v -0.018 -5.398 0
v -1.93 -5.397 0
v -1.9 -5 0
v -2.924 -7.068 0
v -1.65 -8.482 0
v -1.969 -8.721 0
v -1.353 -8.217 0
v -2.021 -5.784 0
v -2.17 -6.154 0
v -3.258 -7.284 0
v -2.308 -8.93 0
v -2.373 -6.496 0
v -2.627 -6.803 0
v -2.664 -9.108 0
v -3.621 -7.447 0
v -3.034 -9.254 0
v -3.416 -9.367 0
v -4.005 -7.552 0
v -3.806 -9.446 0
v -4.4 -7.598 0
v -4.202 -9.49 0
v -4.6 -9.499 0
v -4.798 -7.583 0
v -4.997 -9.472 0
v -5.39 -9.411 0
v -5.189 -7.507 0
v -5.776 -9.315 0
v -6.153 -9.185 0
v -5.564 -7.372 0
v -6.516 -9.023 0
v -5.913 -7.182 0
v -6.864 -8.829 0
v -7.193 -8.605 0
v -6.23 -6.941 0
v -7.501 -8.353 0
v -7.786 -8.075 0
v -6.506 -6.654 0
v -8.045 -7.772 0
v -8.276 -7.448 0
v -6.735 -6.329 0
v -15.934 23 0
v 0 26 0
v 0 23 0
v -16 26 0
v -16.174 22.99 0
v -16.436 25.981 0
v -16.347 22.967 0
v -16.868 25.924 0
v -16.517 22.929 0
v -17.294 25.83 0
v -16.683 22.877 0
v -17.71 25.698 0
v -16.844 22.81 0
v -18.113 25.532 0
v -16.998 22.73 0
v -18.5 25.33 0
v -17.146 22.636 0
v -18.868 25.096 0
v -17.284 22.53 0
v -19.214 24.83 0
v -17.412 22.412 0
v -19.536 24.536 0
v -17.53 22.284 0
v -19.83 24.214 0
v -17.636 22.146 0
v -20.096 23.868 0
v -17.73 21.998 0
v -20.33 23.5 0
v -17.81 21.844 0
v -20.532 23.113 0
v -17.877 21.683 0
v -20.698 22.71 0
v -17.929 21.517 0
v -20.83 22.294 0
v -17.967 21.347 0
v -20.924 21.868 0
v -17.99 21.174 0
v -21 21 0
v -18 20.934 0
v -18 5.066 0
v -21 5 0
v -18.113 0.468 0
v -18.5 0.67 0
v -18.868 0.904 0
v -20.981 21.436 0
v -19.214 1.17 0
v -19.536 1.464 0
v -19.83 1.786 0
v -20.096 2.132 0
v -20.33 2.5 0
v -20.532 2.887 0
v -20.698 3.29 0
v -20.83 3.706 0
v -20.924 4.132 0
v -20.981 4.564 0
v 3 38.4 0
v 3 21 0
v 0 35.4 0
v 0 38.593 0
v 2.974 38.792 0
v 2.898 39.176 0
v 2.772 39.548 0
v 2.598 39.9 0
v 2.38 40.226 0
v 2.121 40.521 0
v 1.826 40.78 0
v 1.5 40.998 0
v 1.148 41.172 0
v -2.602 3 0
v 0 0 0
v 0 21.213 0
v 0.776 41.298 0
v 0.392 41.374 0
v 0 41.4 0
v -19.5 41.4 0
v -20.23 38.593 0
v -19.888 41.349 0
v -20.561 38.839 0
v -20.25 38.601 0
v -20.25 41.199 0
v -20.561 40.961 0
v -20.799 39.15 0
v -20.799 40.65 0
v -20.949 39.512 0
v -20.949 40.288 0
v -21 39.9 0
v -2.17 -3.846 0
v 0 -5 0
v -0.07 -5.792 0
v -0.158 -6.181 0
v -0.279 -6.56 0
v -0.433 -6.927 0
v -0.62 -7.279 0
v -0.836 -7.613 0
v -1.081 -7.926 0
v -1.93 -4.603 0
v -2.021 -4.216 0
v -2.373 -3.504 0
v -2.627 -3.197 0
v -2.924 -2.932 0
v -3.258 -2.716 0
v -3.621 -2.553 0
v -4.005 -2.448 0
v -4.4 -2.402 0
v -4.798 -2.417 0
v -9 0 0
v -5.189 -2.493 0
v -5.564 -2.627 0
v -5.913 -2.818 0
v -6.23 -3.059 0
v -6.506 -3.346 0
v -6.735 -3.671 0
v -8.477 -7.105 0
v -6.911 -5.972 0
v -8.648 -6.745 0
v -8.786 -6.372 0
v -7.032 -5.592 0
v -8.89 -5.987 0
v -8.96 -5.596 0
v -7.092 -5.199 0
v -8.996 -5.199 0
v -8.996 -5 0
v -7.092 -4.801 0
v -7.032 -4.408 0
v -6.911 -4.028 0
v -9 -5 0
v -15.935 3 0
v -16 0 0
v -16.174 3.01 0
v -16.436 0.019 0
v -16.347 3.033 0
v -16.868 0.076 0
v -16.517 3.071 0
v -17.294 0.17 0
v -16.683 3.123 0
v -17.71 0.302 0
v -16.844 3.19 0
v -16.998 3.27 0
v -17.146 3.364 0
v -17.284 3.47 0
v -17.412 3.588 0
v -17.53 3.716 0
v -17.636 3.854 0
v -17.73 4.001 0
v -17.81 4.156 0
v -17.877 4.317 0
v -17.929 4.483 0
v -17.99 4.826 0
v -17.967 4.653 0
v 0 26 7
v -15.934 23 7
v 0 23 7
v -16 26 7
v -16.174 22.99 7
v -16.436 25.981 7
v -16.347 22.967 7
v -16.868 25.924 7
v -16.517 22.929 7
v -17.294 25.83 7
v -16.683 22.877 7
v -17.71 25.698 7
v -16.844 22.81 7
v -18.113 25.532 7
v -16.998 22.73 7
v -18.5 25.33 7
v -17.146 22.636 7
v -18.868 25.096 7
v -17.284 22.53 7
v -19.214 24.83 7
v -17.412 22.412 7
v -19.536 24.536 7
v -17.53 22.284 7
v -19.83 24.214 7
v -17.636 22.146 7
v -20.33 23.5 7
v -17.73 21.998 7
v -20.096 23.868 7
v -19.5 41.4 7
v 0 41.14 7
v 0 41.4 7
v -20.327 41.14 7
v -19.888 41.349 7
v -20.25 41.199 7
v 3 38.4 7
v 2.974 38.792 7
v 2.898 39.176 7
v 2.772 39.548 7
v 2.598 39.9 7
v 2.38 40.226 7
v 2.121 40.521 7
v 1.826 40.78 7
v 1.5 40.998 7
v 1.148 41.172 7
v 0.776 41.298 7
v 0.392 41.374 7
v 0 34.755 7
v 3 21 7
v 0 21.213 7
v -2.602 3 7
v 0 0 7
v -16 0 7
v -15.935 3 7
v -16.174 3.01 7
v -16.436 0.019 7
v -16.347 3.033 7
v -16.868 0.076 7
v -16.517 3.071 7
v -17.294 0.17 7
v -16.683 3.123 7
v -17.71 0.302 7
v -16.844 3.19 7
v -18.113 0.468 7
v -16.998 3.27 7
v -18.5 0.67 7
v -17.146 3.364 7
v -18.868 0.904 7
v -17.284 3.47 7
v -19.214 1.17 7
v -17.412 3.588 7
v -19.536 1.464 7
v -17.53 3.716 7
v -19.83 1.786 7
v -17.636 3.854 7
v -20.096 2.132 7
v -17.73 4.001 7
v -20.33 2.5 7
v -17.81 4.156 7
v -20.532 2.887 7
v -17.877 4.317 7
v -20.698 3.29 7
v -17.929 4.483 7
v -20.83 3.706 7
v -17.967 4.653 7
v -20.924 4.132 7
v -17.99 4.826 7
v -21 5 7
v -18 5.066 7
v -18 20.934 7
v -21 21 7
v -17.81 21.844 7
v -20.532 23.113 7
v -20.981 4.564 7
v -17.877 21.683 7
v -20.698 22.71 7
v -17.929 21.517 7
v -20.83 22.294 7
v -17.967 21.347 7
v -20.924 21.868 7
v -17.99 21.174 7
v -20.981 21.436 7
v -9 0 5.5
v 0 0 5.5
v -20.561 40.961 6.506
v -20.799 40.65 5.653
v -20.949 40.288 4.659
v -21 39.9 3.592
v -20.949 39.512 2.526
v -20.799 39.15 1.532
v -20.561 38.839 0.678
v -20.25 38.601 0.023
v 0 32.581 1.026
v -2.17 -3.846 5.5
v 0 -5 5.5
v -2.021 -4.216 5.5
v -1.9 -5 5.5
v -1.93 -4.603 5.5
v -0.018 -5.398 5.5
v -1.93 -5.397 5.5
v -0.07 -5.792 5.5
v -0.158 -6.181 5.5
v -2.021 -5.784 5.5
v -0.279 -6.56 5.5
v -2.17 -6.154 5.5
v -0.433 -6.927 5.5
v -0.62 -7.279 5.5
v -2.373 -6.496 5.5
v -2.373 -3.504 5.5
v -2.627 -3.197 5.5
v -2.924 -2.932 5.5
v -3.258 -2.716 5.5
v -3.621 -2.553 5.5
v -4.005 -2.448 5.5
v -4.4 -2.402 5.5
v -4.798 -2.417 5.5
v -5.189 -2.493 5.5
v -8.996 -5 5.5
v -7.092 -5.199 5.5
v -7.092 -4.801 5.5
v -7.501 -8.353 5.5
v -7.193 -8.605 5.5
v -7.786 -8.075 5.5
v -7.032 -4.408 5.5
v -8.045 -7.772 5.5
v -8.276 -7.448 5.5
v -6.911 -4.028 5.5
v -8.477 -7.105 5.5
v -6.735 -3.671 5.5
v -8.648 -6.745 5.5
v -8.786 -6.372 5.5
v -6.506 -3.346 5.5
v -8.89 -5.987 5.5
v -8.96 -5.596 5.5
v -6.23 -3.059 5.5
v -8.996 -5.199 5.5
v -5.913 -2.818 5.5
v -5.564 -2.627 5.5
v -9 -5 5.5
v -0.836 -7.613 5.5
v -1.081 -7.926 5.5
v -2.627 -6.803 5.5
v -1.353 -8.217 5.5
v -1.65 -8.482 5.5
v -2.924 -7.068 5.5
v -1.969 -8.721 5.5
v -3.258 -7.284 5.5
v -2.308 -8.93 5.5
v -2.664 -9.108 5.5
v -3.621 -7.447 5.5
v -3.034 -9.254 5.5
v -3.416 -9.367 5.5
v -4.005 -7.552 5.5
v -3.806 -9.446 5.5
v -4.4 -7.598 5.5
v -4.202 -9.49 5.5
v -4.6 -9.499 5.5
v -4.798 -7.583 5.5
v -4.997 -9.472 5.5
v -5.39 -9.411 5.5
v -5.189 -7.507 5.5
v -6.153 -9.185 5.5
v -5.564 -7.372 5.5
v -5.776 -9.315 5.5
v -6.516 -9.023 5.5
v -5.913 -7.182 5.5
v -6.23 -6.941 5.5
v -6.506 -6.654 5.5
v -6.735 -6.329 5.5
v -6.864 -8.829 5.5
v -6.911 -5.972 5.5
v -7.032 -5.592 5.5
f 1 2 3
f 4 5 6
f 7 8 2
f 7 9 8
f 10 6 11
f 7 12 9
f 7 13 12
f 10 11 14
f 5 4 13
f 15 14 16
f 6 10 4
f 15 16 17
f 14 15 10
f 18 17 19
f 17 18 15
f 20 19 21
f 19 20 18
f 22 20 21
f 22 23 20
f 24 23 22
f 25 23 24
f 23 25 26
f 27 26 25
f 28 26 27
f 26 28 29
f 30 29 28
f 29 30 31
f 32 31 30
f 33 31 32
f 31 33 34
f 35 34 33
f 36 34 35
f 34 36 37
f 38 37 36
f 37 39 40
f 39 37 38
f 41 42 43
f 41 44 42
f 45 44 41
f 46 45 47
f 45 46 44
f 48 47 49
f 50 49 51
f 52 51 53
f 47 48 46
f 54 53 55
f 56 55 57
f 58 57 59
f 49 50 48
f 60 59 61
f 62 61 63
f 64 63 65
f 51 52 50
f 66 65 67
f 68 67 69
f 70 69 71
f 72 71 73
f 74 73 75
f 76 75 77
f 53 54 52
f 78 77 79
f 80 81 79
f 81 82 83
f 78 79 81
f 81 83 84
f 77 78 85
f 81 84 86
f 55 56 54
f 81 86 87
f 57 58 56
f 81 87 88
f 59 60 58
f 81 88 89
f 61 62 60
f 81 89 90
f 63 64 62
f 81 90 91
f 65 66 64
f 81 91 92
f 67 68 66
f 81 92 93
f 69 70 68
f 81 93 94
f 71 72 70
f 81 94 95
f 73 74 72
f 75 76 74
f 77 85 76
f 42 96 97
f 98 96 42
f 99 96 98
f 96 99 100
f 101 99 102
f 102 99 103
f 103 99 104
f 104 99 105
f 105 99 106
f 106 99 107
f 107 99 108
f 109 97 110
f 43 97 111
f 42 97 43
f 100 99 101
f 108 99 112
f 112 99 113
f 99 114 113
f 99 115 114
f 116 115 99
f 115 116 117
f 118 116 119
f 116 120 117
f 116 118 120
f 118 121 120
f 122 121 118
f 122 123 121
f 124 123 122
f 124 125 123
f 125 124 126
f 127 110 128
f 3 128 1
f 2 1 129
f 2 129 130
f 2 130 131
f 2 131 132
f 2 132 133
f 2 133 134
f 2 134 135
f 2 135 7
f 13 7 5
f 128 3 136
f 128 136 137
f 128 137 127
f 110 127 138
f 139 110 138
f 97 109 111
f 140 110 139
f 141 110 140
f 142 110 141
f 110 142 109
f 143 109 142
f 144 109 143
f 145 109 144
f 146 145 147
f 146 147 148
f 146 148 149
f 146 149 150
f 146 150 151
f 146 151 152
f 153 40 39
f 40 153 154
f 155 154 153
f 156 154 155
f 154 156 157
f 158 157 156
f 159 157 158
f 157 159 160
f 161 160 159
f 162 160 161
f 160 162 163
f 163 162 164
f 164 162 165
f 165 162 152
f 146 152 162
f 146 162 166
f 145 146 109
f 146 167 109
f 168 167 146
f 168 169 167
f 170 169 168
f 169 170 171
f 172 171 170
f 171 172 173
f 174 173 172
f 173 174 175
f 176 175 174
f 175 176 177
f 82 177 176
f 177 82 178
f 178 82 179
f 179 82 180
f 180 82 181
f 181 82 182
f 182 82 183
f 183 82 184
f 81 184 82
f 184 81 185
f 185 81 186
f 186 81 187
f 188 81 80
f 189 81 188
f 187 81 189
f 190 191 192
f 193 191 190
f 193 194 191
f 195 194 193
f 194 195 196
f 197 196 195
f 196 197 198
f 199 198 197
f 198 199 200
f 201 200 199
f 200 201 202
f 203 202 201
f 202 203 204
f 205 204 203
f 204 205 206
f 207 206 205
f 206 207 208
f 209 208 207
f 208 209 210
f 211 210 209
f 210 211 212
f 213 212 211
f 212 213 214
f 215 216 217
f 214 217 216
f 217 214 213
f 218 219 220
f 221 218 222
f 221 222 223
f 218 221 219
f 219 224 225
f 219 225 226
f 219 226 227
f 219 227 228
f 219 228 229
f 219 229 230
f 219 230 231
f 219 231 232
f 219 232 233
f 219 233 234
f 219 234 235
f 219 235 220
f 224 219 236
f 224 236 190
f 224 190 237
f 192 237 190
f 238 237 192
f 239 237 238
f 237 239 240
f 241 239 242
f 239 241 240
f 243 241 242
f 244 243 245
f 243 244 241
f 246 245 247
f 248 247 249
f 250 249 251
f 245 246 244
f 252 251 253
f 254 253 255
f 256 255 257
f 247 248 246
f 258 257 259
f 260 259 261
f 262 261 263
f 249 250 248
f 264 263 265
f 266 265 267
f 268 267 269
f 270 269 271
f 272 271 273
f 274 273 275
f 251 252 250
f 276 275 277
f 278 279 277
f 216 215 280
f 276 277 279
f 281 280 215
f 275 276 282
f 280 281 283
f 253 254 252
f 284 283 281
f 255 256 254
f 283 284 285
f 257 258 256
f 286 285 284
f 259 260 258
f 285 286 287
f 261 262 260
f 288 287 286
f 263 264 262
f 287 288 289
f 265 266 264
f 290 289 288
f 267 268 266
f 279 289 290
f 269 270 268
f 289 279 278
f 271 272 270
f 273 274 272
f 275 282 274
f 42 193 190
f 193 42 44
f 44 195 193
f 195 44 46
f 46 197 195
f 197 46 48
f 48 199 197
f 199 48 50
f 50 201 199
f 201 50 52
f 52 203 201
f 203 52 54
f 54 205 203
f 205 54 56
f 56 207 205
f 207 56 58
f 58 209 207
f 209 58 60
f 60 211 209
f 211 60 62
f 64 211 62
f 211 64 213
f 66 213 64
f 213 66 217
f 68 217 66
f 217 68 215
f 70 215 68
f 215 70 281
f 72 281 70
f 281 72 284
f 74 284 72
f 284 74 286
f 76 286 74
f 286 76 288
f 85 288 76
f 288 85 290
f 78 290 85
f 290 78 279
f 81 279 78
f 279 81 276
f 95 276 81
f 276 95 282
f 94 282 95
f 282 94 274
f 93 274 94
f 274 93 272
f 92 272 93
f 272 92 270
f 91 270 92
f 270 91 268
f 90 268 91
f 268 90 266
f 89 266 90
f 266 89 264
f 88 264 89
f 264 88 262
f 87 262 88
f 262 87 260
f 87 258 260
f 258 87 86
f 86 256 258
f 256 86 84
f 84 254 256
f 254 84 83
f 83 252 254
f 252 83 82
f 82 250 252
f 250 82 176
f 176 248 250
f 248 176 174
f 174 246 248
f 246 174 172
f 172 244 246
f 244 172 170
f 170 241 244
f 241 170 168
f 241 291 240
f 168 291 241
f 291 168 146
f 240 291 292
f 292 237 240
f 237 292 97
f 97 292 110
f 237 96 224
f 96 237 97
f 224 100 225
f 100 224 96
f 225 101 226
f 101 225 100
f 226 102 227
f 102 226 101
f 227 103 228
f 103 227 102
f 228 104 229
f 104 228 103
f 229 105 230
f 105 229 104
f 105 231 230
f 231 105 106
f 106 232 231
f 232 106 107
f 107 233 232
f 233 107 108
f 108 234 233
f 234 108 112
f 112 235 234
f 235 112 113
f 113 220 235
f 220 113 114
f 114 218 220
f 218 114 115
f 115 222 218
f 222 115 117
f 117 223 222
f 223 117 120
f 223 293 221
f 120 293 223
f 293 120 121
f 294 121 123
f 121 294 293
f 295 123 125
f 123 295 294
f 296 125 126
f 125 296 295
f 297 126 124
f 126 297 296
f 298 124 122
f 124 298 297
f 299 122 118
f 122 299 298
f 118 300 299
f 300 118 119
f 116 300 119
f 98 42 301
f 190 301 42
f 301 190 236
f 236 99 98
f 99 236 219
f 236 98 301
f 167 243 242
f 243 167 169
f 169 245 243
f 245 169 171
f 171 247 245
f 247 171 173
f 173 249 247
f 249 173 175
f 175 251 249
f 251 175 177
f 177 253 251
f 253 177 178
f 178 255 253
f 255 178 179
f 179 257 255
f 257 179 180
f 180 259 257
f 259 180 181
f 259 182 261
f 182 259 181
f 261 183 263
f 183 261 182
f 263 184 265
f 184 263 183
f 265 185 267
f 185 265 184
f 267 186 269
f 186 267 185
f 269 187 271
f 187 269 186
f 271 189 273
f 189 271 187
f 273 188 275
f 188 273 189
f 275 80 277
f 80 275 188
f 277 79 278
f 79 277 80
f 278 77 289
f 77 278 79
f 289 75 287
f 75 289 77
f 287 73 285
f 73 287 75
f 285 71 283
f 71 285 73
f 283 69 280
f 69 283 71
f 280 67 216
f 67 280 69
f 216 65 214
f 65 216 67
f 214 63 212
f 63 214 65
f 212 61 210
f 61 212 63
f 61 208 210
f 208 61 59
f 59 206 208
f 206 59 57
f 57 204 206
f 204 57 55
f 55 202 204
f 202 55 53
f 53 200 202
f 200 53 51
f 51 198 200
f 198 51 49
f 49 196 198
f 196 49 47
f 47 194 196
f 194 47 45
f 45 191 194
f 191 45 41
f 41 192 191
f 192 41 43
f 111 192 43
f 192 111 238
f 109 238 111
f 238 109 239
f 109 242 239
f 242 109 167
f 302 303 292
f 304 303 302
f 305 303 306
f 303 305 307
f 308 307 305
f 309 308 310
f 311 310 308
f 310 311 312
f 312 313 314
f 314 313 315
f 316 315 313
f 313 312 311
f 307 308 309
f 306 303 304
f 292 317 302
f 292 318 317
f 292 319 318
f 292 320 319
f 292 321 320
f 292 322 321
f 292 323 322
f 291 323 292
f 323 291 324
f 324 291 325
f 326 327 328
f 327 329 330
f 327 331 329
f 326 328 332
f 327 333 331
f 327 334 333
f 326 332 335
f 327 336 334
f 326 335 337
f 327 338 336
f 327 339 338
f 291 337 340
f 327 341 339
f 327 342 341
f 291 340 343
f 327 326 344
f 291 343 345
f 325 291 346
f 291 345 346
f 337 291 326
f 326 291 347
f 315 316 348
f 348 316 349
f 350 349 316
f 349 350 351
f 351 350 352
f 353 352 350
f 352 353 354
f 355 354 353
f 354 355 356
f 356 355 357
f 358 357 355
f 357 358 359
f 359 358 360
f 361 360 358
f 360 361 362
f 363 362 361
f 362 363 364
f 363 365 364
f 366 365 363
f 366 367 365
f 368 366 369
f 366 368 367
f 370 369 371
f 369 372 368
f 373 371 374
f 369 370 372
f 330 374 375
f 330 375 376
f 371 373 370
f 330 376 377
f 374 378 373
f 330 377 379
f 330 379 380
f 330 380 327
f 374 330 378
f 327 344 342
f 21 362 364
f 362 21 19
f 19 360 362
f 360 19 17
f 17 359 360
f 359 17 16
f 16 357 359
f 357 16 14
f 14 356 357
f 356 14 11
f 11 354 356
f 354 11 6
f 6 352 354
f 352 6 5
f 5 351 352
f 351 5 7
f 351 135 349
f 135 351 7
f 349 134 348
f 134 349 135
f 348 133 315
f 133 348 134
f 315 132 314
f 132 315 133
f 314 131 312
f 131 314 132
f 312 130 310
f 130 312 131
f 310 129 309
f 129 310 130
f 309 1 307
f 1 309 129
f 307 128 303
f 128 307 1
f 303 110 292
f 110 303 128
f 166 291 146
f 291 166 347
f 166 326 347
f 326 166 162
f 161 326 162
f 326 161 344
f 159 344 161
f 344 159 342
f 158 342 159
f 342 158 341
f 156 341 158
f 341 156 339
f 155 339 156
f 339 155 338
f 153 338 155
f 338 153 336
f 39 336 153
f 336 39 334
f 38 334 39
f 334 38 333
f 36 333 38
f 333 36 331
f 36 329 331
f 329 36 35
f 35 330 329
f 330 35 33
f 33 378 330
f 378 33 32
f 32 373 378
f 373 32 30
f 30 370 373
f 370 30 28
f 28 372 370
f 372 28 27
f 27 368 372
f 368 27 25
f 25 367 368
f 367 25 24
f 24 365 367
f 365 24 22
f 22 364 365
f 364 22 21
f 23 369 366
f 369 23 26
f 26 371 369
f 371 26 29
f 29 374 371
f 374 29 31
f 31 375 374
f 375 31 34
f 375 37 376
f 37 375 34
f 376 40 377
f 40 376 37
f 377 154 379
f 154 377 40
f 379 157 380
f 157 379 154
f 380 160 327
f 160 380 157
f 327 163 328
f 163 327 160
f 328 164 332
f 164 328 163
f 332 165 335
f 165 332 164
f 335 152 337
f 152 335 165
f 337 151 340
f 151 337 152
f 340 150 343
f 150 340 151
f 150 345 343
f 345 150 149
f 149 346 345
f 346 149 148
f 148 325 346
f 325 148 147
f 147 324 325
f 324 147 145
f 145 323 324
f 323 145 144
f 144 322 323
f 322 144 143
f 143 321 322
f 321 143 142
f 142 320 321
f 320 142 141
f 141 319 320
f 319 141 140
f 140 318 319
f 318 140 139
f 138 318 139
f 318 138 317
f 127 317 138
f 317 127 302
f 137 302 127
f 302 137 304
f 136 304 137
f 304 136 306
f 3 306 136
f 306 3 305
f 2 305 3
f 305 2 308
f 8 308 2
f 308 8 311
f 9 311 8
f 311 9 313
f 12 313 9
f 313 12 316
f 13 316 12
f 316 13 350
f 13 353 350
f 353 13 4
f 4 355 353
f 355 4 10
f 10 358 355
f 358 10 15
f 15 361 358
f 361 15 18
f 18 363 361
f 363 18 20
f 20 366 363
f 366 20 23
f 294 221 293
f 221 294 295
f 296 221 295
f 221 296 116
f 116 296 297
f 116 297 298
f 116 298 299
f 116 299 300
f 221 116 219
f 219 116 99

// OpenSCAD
//$fn=60;
$fa=5;
$fs=.4;

D_tab = 11.6;
D_pen = 16.8;
wall_thick = 2.4;
tab_ext = 5.6;
part_width = 10;
join_len = 40+2*part_width;

difference(){
    union(){
        linear_extrude(height=7) part2();
        linear_extrude(height=5.5) part3();
    }
    part1();
}

module part1(){
    translate([-21/2,26+12.4-3]) 
    rotate([-20,0,0]) linear_extrude(height=15) square([21,6],center=true);
}

module part2(){
    part12();

    hull(){
        translate([0,26+12.4]){
            difference(){
                translate([0,0]) circle(d=6);
                translate([-2,-5]) square([10,10],center=true);
            }
        }
        translate([-21+1.5,26+12.4+1.5]) circle(d=3);
    }
    translate([0,26]) square([3,12.4],center=false);
}

module part3(){
    difference(){
        union(){
            translate([-4.5,-5]) circle(d=9);
            translate([-9,-5]) square([9,5]);
        }
        translate([-4.5,-5]) circle(d=5.2);
    }
}

module part12(){
    difference(){
        part11();
        offset(delta=-3) part11();
    }
}

module part11(){
     hull(){
        polygon(points=[[0,0],[0,26],[3,26],[3,21]]);
        translate([-16,5]) circle(d=10);
        translate([-16,21]) circle(d=10);
    }   
}
